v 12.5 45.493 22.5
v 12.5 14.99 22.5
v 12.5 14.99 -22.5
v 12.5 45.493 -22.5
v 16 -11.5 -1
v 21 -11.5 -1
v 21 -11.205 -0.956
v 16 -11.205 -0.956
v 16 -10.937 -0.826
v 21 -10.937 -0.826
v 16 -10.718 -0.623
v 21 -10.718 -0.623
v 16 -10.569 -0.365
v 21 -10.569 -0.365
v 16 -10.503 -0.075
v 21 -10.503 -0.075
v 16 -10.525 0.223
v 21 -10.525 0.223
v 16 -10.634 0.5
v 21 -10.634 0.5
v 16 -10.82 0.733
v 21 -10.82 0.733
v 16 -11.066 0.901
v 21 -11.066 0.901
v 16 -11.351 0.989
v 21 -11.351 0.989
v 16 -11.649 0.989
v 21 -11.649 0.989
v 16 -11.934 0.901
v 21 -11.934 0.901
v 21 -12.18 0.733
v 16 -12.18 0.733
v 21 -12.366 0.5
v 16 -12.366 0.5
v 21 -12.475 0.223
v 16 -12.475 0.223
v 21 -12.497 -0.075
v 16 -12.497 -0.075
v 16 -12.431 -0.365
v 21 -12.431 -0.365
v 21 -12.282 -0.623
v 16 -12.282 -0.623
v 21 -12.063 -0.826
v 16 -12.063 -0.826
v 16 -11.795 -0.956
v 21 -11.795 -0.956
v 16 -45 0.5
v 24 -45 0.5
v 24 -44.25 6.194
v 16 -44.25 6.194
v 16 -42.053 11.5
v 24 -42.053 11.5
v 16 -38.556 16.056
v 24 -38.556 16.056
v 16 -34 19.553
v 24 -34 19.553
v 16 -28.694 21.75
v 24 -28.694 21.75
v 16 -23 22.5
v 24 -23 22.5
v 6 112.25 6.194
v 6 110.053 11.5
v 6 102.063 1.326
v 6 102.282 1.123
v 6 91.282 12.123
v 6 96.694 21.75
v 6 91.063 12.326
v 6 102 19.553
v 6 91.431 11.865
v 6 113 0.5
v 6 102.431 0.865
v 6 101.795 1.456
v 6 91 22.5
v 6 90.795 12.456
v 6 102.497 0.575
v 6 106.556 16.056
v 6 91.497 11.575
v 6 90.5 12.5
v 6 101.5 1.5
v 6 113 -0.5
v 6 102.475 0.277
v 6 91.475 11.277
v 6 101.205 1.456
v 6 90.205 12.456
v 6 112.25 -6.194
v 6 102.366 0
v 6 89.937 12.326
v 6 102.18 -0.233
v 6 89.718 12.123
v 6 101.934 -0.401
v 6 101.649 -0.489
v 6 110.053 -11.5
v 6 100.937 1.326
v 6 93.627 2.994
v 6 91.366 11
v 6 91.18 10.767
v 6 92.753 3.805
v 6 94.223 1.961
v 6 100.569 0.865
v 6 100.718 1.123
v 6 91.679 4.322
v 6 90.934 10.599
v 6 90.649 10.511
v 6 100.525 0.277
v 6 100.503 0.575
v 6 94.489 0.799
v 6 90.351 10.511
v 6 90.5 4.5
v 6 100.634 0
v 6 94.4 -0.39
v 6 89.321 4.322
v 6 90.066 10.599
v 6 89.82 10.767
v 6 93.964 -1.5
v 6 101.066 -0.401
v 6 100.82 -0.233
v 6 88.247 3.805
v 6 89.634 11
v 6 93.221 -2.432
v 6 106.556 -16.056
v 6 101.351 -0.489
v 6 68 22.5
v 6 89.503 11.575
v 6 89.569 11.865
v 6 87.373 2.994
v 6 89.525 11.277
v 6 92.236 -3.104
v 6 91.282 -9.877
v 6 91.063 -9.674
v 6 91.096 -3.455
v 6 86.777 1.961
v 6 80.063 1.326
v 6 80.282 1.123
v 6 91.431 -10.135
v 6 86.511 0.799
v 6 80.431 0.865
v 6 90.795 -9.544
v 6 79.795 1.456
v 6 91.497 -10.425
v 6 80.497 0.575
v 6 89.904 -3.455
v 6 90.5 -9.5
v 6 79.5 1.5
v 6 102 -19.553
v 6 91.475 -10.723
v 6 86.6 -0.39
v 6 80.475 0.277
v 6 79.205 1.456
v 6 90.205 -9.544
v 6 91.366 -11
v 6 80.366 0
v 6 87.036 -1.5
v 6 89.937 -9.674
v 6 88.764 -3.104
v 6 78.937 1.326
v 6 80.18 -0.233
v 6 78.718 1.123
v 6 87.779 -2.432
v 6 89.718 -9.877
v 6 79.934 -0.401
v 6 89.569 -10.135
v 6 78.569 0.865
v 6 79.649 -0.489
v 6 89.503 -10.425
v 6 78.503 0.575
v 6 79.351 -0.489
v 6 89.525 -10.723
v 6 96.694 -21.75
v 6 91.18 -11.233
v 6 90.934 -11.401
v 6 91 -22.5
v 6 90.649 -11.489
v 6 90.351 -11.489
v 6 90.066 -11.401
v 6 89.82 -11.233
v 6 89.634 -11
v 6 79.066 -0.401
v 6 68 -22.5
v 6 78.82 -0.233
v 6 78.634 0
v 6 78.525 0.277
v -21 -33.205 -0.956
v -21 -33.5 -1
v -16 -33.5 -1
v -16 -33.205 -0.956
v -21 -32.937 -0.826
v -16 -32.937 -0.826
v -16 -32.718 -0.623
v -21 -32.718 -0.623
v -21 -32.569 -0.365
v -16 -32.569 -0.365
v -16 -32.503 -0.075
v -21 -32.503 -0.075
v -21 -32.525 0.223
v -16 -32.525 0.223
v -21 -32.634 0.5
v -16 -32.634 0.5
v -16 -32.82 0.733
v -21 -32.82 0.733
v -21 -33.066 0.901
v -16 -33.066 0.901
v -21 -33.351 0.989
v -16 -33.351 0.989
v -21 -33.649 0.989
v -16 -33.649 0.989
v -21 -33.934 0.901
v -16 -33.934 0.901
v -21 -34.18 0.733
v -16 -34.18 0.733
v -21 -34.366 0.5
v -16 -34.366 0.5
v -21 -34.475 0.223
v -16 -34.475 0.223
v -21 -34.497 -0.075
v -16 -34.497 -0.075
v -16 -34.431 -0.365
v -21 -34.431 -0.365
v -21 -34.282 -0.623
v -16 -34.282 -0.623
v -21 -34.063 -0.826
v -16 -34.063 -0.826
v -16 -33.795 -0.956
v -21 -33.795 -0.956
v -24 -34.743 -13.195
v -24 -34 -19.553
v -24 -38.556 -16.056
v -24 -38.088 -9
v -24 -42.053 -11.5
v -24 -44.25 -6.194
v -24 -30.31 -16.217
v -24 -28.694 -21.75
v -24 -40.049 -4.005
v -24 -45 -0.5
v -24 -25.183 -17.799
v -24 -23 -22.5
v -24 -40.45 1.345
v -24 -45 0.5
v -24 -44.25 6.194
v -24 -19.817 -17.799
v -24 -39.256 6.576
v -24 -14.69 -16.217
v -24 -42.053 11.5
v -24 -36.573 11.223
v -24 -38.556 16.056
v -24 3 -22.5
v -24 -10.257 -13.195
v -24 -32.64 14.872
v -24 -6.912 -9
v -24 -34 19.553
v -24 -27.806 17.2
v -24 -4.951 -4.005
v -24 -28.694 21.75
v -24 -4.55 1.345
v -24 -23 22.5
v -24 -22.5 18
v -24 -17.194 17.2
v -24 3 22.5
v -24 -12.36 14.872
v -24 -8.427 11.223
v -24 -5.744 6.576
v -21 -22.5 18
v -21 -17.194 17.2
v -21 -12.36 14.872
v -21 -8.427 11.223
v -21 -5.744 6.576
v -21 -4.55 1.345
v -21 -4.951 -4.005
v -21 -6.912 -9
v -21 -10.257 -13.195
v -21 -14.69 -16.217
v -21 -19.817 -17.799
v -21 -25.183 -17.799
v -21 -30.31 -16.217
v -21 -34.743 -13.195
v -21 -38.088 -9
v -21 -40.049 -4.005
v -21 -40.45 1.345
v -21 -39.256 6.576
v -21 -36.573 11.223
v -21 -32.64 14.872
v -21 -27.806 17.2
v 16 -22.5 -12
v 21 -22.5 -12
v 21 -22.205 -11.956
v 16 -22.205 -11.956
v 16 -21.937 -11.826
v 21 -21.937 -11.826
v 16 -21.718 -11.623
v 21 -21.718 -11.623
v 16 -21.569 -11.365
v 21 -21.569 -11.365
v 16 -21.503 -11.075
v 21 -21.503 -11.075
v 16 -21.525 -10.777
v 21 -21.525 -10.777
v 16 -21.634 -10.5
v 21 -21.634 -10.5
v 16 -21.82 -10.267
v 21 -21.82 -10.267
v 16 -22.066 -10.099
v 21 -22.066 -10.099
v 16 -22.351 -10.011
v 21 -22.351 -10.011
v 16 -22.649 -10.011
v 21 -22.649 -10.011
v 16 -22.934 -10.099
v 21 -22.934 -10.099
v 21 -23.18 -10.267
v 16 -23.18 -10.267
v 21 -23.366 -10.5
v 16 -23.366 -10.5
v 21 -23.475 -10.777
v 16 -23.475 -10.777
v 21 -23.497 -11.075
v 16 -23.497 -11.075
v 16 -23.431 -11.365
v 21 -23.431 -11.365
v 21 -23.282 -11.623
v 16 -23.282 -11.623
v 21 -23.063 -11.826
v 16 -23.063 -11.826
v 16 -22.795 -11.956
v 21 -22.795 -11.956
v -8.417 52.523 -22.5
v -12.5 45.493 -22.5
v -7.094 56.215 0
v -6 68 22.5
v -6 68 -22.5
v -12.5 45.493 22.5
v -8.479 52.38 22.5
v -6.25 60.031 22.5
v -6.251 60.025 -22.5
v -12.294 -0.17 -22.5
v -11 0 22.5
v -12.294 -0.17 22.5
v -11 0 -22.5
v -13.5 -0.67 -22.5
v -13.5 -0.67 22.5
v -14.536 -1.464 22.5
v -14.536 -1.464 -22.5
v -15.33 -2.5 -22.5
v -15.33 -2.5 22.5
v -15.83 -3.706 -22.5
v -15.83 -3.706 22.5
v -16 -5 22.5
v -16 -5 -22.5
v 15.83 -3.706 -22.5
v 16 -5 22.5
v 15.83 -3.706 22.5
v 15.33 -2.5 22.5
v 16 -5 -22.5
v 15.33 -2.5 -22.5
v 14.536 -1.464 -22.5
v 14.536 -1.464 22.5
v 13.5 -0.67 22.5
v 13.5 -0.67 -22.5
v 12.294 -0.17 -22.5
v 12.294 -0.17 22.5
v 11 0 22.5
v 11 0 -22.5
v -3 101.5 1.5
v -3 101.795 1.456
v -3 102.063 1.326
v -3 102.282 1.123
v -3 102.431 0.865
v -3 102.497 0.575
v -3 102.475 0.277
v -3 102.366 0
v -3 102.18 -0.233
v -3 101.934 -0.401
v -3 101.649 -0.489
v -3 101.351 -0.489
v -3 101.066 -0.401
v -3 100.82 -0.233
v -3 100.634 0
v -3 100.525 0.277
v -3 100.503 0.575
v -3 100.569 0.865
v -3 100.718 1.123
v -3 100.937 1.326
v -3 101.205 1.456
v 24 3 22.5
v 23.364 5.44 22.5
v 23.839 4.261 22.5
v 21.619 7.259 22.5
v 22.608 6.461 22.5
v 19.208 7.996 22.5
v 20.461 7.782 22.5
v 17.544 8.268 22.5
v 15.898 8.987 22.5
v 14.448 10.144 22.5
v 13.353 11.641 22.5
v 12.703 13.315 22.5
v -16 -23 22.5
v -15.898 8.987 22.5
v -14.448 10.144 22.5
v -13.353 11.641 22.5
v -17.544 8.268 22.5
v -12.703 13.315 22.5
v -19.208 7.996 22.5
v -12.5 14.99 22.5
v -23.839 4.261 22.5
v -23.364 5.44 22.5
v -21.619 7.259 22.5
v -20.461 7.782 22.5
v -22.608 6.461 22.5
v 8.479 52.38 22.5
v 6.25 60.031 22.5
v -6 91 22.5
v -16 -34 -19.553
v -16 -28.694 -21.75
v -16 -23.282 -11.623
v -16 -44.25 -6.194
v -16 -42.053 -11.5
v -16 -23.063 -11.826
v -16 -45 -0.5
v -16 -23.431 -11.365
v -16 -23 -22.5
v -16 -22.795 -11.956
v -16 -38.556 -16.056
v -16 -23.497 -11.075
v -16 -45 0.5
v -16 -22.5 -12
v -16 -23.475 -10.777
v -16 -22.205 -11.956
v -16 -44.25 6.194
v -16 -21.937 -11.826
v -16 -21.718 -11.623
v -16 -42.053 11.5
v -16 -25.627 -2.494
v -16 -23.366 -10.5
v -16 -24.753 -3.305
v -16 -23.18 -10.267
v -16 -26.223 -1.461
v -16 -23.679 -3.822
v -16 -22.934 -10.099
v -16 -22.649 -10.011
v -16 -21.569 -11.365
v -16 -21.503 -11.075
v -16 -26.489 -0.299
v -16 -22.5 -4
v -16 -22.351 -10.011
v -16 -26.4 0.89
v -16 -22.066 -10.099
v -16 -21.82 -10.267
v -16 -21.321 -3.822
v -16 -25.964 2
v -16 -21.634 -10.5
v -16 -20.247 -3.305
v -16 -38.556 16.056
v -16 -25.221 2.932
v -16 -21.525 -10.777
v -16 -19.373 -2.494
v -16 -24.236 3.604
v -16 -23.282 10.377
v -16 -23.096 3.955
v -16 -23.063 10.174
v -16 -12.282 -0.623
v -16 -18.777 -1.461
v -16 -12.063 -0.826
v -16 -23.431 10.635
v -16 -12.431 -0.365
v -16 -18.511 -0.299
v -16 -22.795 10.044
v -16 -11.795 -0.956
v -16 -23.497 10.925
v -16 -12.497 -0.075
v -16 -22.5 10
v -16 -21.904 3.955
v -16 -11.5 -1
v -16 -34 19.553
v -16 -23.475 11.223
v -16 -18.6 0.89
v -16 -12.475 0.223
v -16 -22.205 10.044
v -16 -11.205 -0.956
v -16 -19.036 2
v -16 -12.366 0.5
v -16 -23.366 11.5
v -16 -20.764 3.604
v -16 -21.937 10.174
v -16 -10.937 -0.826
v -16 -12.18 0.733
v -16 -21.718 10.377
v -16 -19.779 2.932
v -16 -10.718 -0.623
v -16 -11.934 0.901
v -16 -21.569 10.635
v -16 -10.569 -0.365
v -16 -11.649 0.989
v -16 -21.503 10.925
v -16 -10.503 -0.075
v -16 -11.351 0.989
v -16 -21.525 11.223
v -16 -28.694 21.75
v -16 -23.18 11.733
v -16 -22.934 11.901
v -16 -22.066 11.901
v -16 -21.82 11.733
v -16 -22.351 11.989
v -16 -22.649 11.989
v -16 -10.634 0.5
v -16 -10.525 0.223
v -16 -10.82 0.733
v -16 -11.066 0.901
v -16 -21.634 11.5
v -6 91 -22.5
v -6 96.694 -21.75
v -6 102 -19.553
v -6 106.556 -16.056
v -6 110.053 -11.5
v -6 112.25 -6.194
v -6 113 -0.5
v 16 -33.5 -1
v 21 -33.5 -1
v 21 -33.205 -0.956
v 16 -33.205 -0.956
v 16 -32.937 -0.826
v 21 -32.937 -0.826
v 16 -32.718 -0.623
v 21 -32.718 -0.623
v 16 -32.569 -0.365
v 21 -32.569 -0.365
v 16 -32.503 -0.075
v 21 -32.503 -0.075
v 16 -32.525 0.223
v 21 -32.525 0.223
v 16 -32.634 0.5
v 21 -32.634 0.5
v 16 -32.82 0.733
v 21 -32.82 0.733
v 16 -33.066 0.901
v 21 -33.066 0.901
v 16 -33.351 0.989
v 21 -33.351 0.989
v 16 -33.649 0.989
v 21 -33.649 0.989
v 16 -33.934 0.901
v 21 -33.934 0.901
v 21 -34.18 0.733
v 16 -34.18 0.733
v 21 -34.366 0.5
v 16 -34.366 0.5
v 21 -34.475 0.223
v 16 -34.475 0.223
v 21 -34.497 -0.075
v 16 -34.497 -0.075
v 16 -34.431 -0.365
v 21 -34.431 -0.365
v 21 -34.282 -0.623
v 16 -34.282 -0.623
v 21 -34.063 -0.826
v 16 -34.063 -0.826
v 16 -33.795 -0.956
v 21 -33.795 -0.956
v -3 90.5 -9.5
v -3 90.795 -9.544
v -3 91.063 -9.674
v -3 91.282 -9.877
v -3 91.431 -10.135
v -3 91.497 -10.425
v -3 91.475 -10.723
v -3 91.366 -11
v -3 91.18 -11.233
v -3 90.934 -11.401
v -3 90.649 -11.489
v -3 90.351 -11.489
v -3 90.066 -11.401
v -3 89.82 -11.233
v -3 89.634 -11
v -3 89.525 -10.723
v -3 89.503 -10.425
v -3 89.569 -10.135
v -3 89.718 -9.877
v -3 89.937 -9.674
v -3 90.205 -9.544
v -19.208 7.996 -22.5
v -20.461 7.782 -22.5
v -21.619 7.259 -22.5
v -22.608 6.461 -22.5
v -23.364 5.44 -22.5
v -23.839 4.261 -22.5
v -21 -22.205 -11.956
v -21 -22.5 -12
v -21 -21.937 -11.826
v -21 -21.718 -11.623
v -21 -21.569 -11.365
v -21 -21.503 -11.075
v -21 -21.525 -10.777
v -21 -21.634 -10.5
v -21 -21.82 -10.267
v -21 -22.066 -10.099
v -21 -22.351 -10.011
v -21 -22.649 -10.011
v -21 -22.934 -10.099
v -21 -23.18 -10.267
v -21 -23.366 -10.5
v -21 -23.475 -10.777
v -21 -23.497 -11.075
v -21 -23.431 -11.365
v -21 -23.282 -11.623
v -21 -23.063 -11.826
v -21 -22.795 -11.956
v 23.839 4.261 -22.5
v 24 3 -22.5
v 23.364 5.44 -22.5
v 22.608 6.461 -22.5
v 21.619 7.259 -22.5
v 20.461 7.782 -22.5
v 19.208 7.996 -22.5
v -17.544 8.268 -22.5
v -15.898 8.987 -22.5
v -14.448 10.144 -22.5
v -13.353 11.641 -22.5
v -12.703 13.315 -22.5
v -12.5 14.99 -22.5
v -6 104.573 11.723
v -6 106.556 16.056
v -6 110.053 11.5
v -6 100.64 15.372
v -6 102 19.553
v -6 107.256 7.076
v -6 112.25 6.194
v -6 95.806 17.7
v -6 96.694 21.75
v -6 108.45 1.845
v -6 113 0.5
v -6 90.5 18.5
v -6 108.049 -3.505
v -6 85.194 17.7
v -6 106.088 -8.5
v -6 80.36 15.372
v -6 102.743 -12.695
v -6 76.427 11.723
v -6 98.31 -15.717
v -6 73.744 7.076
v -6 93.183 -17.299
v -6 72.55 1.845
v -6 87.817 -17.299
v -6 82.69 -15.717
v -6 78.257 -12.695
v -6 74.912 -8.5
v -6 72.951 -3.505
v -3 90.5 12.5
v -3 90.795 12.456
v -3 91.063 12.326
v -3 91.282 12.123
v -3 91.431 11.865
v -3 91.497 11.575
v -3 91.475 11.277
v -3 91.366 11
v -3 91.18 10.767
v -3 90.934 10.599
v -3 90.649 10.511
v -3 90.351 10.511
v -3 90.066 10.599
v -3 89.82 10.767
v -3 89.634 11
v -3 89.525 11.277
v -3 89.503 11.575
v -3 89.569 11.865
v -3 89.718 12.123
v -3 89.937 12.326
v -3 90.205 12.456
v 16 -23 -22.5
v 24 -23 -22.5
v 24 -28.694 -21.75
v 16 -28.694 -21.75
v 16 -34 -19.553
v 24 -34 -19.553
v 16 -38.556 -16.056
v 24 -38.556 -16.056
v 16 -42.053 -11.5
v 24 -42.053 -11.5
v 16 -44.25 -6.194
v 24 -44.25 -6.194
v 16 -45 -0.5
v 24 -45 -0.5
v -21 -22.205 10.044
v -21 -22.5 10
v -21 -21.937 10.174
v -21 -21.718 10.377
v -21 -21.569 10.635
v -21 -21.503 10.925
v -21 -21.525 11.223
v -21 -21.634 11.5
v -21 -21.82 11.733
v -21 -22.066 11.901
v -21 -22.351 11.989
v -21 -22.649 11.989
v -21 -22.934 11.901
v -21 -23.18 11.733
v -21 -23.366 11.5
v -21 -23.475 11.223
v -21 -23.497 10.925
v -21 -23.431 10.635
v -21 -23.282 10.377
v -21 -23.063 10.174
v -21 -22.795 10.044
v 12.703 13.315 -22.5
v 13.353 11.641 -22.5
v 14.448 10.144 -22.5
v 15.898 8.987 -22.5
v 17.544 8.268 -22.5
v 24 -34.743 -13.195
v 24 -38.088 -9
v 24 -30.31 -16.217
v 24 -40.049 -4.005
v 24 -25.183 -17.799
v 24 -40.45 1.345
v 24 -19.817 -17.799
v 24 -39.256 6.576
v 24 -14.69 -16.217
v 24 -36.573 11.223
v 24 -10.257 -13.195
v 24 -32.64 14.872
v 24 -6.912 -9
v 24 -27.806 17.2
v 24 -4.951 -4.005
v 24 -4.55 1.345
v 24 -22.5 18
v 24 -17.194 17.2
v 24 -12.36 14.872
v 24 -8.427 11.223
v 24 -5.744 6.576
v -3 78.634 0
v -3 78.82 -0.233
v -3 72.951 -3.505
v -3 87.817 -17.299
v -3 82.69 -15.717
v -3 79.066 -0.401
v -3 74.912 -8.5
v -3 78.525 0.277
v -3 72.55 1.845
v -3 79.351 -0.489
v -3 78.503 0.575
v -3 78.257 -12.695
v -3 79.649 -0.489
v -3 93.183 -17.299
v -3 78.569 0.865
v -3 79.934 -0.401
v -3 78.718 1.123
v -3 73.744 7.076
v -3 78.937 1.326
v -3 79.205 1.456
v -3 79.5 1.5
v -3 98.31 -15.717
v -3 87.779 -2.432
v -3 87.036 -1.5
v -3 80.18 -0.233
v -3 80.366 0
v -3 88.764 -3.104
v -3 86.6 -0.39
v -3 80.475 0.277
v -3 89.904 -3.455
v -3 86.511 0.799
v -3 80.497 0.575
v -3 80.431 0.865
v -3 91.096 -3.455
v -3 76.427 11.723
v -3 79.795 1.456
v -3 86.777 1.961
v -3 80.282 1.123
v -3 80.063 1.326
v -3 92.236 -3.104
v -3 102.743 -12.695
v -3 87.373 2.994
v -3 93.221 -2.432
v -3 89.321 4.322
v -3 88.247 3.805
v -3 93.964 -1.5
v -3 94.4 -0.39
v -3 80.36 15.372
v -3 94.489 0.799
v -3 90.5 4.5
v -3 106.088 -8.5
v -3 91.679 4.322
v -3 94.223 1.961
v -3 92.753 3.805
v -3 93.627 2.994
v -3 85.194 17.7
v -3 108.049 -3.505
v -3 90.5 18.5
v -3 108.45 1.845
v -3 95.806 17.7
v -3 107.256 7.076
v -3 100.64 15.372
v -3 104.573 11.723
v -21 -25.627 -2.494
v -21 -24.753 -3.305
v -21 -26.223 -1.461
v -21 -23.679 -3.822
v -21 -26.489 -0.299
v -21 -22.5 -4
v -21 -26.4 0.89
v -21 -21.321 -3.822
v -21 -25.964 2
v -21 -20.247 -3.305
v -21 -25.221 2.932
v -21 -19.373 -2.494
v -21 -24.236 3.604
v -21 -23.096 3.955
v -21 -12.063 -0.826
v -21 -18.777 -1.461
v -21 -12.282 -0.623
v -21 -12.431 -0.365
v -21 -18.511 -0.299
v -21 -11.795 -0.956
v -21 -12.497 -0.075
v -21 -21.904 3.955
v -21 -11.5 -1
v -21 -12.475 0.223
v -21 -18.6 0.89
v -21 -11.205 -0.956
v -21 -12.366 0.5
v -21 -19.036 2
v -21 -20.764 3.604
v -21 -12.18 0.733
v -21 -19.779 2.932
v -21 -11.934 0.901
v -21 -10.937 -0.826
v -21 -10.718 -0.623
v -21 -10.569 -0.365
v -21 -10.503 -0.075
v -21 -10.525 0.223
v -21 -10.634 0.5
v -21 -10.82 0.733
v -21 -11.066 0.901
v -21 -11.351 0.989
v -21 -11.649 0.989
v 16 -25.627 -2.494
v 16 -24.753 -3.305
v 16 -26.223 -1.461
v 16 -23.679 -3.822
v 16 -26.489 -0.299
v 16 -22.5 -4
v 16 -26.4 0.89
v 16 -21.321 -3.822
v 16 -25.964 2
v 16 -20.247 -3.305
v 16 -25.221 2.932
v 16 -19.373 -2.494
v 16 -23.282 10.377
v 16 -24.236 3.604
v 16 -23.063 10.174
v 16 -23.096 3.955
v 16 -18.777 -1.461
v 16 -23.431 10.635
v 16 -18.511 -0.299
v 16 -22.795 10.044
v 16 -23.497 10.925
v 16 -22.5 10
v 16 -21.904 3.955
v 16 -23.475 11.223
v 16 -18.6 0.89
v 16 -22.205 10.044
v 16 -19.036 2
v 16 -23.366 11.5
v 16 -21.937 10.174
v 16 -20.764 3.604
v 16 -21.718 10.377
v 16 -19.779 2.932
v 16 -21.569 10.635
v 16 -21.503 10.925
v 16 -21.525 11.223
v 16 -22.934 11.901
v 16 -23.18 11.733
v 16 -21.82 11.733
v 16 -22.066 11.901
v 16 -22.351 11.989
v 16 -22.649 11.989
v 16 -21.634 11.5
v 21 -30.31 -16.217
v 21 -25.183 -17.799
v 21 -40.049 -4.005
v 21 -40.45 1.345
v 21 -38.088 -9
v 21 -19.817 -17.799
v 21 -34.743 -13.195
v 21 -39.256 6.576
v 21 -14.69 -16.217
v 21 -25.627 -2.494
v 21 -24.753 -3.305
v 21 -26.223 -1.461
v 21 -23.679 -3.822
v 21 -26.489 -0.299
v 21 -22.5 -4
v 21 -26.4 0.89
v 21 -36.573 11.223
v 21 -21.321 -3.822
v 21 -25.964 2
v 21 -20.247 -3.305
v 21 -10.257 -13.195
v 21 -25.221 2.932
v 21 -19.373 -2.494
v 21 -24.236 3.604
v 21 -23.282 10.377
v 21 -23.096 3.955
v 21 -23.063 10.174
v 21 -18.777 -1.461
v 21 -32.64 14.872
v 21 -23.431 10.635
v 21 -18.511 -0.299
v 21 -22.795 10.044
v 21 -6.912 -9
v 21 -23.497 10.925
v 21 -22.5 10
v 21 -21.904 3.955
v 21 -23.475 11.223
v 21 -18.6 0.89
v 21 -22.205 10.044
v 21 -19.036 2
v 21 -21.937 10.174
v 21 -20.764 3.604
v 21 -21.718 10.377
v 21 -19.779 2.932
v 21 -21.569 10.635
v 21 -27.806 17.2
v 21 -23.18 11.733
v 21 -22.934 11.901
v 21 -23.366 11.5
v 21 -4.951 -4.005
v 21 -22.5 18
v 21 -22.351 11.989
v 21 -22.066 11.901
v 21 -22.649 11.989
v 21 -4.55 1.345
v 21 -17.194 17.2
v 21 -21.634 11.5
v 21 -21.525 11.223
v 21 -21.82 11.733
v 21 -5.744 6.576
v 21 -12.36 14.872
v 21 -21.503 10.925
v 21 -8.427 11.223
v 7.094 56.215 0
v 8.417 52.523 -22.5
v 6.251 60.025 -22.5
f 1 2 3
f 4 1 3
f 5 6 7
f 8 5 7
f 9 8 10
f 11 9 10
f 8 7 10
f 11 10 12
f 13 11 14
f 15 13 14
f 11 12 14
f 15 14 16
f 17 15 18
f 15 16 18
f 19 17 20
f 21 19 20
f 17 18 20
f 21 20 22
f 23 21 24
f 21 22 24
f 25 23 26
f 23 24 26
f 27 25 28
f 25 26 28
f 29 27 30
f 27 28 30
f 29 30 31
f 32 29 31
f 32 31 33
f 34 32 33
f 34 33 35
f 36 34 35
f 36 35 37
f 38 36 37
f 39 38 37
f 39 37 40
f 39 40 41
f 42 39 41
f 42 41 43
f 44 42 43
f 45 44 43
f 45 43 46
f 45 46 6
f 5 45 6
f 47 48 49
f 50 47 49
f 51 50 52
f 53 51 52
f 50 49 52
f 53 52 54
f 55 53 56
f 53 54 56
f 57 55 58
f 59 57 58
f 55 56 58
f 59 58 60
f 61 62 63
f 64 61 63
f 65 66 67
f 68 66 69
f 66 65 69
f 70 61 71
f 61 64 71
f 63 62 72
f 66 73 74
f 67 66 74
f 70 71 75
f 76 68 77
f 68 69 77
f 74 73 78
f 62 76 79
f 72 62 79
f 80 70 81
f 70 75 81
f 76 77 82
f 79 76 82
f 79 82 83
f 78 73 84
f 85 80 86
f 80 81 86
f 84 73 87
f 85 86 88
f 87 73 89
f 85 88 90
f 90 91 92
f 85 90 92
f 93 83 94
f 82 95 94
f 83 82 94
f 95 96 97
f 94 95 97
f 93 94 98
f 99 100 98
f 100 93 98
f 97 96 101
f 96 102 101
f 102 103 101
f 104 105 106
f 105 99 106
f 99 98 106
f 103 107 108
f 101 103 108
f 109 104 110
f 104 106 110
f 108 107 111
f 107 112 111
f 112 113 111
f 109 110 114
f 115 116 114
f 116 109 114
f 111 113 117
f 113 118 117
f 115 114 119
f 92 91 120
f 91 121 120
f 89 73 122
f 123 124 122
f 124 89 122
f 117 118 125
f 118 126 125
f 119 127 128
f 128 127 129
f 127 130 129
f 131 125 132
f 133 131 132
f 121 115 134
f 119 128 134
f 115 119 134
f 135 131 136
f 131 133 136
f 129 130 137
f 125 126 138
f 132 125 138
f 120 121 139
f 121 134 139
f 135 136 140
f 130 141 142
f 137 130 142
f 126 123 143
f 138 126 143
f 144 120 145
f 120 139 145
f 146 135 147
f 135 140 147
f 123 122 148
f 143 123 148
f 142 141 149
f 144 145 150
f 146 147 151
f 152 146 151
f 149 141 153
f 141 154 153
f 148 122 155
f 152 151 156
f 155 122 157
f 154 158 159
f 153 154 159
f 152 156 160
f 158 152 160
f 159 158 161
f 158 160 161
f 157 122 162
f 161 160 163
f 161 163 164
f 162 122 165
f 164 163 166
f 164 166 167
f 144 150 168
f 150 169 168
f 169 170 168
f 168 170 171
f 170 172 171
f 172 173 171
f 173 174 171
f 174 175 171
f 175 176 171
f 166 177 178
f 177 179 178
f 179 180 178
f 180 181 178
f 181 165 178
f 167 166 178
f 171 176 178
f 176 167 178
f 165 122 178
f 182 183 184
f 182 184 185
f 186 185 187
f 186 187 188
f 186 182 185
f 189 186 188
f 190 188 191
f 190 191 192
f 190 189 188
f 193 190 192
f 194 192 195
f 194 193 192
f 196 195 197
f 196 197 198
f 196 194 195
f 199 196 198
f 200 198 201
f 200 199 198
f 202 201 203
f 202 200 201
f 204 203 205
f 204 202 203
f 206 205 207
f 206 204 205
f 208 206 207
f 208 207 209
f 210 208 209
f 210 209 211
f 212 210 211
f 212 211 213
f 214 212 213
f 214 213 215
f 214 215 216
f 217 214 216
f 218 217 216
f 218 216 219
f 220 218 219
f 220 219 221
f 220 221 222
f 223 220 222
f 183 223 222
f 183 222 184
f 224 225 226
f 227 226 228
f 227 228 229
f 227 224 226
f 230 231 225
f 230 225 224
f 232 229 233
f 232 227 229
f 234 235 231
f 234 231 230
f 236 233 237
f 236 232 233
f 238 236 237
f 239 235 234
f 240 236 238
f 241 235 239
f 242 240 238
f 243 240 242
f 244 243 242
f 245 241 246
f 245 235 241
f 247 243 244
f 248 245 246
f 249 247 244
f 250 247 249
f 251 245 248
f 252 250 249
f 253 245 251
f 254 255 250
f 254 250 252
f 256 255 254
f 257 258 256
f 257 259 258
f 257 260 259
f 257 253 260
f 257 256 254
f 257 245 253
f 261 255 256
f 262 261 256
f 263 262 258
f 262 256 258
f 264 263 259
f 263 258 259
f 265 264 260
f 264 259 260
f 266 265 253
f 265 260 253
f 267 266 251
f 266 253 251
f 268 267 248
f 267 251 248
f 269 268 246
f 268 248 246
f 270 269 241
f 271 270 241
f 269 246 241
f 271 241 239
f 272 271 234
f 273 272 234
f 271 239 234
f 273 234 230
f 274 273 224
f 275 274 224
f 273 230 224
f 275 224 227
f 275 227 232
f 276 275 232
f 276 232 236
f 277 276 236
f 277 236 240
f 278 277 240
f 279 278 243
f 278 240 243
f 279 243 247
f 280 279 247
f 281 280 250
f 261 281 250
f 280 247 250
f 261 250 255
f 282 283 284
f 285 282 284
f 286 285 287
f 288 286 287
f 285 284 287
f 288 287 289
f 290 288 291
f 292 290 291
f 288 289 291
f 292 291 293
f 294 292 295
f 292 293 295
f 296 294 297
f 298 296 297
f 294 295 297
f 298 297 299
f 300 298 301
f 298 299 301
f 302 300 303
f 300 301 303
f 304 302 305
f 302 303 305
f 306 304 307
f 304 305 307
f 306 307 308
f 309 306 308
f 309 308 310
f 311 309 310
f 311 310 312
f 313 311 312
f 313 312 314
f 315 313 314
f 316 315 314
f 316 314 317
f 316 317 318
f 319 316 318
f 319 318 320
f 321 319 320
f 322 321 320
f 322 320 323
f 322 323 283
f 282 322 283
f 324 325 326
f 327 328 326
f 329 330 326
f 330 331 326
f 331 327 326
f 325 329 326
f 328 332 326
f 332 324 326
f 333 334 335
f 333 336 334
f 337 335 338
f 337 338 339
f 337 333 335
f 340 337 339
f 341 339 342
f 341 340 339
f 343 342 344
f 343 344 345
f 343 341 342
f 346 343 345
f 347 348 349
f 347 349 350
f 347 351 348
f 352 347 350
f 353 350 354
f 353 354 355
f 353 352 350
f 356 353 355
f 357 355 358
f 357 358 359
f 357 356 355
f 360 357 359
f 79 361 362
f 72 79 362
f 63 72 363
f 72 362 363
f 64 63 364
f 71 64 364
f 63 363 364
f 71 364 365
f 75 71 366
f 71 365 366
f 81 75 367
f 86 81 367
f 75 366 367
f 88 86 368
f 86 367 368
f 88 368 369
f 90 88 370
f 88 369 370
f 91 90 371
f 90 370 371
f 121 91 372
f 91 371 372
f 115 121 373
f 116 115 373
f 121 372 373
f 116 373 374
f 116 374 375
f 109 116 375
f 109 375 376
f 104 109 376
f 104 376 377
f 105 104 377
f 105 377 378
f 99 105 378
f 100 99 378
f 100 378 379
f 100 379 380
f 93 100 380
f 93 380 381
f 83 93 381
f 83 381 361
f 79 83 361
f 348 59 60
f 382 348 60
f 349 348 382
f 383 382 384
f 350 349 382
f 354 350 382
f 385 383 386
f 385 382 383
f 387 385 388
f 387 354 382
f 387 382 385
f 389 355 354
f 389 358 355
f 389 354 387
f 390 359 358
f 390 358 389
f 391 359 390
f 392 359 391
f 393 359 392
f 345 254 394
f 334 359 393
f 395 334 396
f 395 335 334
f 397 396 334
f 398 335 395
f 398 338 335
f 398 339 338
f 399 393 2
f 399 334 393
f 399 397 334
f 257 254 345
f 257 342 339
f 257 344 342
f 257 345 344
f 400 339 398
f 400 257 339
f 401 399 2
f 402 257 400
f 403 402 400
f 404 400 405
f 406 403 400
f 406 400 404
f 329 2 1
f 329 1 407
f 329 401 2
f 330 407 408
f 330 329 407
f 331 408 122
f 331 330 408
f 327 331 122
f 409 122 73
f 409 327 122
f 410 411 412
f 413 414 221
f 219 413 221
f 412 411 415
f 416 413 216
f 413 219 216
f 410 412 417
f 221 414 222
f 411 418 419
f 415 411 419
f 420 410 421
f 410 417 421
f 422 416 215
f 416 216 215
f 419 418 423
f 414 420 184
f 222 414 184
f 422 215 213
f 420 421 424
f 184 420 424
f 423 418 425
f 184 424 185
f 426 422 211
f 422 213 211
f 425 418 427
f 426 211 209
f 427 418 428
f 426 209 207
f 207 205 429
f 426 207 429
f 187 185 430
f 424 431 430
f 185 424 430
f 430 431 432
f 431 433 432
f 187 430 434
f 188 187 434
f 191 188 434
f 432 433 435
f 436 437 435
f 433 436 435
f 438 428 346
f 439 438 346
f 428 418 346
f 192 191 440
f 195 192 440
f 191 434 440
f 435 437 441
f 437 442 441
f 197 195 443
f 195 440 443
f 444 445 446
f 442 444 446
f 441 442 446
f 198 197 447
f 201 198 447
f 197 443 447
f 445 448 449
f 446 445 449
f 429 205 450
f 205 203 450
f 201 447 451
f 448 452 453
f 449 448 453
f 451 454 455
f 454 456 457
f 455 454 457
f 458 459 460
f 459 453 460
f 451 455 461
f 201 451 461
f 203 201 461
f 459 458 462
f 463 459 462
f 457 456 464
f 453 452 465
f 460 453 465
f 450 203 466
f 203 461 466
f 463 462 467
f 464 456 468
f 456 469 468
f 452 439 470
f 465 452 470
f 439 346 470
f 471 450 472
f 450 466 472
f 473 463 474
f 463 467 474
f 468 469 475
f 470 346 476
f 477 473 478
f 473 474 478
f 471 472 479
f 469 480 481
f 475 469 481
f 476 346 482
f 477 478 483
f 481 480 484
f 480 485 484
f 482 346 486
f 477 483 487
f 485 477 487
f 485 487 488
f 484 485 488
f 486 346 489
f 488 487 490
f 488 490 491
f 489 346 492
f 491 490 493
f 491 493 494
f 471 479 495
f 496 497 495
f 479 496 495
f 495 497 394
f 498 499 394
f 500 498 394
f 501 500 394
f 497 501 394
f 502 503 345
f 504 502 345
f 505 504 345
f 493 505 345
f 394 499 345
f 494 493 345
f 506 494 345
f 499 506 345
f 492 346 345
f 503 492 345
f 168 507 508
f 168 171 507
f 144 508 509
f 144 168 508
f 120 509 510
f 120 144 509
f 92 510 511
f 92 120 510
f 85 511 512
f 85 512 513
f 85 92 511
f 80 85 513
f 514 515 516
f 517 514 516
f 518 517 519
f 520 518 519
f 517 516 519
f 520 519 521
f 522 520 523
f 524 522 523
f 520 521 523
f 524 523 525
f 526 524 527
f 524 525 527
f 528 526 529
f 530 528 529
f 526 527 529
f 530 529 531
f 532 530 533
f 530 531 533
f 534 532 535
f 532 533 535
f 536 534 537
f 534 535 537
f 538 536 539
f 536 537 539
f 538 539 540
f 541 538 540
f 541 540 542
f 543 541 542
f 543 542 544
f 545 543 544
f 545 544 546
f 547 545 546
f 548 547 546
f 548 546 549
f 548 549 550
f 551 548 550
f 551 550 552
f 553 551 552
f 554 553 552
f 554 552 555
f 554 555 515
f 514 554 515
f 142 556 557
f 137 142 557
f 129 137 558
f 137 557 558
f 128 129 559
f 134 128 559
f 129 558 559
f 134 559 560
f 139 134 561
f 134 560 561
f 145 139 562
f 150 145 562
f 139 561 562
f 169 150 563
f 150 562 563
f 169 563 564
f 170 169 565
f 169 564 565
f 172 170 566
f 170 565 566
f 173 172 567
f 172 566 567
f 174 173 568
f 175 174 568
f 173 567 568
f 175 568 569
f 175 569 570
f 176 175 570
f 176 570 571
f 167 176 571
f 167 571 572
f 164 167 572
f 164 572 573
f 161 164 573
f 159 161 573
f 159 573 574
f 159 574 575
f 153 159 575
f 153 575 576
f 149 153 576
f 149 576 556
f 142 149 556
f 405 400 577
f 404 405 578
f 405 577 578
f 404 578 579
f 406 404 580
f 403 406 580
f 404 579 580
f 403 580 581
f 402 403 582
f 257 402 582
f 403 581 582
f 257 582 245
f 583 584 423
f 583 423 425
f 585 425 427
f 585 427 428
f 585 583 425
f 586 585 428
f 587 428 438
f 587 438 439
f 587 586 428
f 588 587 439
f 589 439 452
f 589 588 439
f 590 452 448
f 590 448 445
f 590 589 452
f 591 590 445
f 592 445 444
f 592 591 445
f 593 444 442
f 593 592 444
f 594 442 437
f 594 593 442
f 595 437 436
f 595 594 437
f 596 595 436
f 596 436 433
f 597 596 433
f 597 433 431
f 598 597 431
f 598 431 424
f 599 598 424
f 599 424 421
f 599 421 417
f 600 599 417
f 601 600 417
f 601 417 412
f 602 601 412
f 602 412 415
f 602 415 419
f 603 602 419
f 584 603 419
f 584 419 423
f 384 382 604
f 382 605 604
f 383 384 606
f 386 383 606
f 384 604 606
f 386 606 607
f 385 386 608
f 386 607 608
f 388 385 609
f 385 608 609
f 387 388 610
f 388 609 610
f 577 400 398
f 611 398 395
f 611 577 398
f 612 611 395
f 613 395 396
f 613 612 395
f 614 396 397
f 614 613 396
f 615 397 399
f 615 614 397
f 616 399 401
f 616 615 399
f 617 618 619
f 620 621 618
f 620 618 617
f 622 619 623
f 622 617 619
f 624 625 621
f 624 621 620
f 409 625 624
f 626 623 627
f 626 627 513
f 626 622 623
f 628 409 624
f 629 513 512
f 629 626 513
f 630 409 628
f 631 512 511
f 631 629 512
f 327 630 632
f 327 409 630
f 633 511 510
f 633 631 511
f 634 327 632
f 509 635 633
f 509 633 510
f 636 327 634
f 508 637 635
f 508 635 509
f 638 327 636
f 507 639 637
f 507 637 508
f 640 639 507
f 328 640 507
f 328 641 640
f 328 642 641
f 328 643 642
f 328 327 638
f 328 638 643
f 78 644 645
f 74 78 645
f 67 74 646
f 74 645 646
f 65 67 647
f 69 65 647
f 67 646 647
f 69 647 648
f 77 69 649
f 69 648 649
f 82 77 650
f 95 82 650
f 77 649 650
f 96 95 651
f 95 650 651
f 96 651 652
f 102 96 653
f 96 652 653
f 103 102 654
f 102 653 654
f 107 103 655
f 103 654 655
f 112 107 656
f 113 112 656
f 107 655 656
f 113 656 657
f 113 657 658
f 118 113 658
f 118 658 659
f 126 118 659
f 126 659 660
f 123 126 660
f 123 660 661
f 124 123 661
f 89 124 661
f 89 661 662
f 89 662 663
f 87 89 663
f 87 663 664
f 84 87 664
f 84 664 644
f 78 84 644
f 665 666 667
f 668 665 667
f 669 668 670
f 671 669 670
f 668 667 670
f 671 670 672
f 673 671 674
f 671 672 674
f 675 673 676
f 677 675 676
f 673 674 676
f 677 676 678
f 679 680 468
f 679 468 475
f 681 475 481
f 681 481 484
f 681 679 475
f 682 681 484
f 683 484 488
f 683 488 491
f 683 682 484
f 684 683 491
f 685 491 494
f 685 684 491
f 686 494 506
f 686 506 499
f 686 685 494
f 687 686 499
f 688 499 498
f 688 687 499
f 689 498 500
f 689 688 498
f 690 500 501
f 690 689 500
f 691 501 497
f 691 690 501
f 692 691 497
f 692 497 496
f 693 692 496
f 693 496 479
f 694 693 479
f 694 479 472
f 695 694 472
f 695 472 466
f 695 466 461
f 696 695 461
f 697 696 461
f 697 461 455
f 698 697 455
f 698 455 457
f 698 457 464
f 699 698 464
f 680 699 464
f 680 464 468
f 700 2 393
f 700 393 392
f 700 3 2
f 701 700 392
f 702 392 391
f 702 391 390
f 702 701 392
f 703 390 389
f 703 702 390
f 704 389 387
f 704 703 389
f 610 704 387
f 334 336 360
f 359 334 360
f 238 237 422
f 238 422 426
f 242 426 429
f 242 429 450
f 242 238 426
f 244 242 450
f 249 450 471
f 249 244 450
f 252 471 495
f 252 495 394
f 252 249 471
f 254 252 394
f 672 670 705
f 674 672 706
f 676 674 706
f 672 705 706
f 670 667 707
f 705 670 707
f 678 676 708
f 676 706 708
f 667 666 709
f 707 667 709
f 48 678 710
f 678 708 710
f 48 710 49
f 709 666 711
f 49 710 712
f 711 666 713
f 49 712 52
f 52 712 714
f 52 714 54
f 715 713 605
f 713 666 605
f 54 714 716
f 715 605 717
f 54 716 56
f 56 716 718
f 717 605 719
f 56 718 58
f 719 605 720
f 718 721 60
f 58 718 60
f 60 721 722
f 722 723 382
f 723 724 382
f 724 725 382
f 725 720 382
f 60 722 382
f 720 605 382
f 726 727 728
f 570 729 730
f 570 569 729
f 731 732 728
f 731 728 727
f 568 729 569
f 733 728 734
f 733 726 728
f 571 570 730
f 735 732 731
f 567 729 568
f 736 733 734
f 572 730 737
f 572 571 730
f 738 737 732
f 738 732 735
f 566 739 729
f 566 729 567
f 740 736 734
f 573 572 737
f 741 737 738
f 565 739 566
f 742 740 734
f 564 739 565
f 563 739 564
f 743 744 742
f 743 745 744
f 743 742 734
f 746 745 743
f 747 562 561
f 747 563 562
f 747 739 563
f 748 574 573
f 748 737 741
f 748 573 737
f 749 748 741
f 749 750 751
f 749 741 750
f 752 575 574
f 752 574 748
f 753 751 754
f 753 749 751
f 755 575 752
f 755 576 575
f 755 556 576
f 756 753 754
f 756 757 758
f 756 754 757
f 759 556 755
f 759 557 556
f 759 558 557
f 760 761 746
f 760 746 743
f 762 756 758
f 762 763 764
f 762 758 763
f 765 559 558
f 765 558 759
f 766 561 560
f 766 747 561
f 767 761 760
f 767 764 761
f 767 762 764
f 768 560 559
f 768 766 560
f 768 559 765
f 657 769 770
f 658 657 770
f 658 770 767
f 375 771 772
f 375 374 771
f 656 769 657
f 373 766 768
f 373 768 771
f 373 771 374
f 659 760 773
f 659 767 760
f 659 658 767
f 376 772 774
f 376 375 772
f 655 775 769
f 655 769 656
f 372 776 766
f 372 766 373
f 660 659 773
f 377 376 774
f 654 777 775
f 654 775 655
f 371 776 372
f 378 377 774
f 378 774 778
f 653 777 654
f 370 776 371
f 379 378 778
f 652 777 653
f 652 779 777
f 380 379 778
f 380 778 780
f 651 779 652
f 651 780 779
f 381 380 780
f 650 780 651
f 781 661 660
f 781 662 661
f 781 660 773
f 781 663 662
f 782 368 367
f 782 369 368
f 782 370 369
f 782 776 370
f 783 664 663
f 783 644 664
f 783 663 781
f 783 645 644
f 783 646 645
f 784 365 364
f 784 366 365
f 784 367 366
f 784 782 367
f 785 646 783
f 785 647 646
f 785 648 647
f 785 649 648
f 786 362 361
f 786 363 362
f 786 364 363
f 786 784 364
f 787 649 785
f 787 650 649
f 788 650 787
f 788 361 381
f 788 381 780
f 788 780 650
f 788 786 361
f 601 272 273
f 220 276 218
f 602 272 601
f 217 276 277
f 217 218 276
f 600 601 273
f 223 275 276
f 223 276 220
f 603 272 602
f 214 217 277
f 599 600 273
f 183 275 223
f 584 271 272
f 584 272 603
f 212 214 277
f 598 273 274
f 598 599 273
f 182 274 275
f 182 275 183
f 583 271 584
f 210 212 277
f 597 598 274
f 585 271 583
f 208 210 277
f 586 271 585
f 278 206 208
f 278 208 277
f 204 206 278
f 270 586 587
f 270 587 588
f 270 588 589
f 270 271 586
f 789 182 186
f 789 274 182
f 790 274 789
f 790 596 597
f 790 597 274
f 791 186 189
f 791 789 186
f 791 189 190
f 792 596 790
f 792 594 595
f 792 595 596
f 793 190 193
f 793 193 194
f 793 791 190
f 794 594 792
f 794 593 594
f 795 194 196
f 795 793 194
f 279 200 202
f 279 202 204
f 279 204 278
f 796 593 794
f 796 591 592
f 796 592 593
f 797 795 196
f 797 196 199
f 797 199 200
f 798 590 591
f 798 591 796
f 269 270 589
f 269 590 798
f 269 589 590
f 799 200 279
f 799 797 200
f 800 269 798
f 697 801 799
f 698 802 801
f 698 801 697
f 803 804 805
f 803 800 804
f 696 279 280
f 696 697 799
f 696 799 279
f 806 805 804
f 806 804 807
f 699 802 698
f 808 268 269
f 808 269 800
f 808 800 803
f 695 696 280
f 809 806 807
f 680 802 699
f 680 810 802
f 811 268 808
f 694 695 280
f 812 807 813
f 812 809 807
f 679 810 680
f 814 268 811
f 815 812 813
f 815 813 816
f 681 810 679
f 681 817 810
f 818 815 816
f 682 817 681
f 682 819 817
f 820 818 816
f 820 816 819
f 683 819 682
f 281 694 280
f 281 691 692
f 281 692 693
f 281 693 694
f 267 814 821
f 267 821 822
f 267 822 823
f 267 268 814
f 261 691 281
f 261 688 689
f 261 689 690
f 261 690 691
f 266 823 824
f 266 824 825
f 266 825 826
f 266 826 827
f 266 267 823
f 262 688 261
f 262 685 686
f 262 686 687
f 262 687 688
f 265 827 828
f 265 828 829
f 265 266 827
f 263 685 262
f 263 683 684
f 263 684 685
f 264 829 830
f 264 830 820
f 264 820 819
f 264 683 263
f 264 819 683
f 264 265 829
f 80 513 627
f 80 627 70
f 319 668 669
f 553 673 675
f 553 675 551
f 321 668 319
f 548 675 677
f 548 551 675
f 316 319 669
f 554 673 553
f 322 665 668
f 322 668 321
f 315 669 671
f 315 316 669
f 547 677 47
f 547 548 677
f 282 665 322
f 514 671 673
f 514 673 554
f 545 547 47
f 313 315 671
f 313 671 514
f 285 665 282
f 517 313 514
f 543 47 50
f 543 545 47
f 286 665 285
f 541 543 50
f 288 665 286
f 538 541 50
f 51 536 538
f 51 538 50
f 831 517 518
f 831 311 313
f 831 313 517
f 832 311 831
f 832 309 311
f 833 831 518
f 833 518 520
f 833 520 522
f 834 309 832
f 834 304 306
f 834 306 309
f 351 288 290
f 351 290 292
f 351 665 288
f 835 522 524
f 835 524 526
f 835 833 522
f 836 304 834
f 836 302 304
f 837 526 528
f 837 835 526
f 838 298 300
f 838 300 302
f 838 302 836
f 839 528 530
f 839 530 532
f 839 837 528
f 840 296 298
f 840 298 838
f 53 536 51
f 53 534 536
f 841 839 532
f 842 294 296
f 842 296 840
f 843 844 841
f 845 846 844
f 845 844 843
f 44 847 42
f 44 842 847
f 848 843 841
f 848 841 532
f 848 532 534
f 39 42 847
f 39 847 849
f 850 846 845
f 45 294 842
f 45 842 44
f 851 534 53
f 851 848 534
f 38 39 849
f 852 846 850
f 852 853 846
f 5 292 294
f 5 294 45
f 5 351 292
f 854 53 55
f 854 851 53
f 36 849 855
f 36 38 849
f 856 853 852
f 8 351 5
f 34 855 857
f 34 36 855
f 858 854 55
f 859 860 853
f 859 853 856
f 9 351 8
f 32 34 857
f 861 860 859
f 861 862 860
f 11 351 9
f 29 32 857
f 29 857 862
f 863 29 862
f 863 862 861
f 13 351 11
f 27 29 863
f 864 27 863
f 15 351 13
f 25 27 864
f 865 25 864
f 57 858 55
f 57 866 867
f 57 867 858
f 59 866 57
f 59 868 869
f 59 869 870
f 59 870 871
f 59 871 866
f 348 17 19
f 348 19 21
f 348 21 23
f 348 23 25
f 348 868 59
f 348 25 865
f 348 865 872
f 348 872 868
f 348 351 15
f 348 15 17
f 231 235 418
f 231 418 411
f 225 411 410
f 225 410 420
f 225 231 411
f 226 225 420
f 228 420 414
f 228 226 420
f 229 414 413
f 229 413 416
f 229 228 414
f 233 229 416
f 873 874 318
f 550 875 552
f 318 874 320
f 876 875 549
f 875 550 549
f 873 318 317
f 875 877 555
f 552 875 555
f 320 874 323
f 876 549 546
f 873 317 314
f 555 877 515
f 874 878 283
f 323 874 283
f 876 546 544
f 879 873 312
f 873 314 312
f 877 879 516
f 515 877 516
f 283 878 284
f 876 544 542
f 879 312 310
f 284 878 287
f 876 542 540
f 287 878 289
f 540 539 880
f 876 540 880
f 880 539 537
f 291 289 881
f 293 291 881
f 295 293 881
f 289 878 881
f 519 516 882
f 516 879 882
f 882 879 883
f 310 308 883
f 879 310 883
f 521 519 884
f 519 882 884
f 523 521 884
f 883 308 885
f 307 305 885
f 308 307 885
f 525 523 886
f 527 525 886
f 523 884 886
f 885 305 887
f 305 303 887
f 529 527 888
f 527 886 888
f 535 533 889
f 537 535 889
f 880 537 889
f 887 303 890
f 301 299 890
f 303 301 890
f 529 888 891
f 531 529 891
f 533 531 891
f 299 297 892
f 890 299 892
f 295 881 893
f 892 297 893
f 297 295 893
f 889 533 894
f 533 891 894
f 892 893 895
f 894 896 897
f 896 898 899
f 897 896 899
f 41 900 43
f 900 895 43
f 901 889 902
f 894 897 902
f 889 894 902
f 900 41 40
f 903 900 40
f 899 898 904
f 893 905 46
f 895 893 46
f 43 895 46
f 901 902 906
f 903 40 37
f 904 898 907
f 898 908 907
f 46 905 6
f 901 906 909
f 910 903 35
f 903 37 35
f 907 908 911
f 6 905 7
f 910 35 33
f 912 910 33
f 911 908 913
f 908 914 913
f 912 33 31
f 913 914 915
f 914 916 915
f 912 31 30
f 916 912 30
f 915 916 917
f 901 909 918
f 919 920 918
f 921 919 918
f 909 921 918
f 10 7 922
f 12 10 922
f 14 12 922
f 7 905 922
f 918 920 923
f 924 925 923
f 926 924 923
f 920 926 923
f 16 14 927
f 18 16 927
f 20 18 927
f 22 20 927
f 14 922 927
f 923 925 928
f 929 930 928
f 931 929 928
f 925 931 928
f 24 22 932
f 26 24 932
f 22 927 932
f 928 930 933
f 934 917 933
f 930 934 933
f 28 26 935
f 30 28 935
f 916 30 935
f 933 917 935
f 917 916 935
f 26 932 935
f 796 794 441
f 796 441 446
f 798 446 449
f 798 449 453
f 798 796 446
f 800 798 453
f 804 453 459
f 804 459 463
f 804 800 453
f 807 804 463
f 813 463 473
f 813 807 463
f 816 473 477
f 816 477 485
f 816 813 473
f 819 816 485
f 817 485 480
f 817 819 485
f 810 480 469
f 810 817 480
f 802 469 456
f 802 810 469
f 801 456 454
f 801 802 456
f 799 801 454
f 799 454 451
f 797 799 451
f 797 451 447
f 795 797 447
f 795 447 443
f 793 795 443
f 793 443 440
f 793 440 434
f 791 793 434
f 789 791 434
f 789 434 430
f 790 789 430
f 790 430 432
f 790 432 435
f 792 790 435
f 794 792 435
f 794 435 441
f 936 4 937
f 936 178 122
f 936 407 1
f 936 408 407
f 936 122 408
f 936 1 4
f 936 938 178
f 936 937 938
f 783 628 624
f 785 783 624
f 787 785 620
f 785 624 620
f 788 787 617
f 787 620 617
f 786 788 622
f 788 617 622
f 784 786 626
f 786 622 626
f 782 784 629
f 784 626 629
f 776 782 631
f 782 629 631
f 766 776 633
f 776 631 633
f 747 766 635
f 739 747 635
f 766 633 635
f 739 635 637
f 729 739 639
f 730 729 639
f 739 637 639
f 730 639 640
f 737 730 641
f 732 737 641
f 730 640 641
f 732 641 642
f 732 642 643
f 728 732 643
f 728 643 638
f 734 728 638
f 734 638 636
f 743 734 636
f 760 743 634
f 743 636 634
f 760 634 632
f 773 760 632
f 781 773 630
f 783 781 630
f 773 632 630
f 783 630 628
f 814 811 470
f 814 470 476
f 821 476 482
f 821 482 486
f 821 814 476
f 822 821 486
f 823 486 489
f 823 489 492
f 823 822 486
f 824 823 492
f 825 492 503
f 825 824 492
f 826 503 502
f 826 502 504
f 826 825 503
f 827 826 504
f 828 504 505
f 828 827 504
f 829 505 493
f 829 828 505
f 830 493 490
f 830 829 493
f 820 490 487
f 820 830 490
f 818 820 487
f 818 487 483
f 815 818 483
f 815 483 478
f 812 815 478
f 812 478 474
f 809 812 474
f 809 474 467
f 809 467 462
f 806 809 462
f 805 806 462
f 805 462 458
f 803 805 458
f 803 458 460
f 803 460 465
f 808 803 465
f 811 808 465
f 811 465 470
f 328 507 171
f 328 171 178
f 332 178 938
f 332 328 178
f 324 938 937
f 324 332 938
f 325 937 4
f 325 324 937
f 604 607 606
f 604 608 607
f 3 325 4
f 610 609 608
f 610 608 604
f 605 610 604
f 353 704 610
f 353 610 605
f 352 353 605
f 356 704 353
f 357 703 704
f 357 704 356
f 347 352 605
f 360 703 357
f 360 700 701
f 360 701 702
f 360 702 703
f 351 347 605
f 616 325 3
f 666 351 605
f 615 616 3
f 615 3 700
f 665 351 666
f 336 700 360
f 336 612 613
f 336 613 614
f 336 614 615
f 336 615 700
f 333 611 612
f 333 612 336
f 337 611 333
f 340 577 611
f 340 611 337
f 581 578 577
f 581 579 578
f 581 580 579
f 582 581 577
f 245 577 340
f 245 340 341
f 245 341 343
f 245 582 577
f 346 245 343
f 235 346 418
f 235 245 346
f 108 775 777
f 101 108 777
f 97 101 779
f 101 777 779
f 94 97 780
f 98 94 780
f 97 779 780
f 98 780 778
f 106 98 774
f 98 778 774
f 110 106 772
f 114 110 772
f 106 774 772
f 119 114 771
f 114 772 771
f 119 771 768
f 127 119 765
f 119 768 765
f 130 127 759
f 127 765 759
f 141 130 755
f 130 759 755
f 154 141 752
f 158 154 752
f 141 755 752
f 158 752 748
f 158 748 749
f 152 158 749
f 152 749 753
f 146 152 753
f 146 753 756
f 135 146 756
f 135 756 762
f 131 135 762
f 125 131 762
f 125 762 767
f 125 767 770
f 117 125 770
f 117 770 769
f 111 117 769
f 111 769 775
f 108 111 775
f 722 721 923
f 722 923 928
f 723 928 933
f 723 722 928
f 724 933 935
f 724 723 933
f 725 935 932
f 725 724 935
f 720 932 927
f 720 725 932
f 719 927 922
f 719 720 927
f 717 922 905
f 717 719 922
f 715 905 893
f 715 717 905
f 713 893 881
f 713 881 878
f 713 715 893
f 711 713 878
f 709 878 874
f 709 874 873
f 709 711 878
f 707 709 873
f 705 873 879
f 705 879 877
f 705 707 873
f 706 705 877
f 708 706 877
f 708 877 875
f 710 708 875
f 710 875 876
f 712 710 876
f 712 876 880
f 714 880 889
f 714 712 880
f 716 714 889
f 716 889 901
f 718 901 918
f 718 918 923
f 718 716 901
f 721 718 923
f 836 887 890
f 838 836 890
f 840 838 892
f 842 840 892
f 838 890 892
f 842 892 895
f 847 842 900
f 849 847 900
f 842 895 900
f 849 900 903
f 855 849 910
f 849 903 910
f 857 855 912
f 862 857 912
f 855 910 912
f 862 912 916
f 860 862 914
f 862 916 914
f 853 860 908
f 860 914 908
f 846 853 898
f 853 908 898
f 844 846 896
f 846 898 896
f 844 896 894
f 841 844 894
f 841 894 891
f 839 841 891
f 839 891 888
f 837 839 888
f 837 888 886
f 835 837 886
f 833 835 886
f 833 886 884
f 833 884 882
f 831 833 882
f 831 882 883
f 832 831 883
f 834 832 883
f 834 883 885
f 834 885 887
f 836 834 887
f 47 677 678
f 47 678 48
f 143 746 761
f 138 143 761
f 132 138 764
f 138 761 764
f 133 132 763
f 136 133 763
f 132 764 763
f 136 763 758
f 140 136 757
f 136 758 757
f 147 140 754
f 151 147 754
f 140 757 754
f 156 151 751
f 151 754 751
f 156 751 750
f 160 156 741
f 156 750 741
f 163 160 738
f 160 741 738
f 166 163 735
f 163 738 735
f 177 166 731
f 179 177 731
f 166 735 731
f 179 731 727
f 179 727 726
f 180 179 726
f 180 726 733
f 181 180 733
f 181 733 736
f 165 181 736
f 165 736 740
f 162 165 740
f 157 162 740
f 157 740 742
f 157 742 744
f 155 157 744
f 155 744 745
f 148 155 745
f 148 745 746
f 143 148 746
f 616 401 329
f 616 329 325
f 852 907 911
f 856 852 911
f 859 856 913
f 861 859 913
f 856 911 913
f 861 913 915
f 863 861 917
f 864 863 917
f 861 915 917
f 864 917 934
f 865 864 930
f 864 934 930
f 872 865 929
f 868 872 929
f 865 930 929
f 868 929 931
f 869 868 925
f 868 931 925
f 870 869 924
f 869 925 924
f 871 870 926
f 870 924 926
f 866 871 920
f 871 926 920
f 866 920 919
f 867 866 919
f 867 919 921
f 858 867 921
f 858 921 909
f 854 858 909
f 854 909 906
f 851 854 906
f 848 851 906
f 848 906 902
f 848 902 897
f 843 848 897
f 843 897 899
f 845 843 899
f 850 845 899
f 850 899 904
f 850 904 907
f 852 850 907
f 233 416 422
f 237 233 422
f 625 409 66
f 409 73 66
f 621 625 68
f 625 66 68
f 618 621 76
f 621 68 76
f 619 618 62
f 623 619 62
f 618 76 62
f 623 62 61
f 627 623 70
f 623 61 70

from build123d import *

# Parameters (mm, degrees)
SKETCH2_W           = 48
SKETCH2_H           = 45
BOSS_EXTRUDE1_DEPTH = 8
BOSS_EXTRUDE2_DEPTH = 8
CUT_EXTRUDE1_START  = -8
SKETCH4_R           = 18
CUT_EXTRUDE1_DEPTH  = 3
SKETCH5_R           = 4
SKETCH5_R_2         = 1
CUT_EXTRUDE2_DEPTH  = 46
SKETCH6_W           = 25
SKETCH6_H           = 45
BOSS_EXTRUDE3_DEPTH = 60
FILLET7_R           = 5
SKETCH7_W           = 12
SKETCH7_H           = 45
BOSS_EXTRUDE4_DEPTH = 45
FILLET10_R          = 22
SKETCH8_R           = 18
CUT_EXTRUDE3_DEPTH  = 3
SKETCH9_R           = 4
SKETCH9_R_2         = 1
CUT_EXTRUDE4_DEPTH  = 28
CUT_EXTRUDE5_DEPTH  = 46
FILLET11_R          = 5
FILLET12_R          = 7


with BuildPart() as part:
    # Sketch2 → Boss-Extrude1 (new body)
    with BuildSketch(Plane(origin=(0, 0, 0), x_dir=(1, 0, 0), z_dir=(0, 1, 0))):
        Rectangle(SKETCH2_W, SKETCH2_H)
    extrude(amount=BOSS_EXTRUDE1_DEPTH)

    # Sketch3 → Boss-Extrude2 (add)
    with BuildSketch(Plane(origin=(24, 0, 0), x_dir=(0, 0, -1), z_dir=(1, 0, 0))):
        with BuildLine():
            Line((-22.5, 0), (22.5, 0))
            Line((22.5, 0), (22.5, -23))
            ThreePointArc((22.5, -23), (16.056349186, -38.556349186), (0.5, -45))
            Line((0.5, -45), (-0.5, -45))
            ThreePointArc((-0.5, -45), (-16.056349186, -38.556349186), (-22.5, -23))
            Line((-22.5, -23), (-22.5, 0))
        make_face()
    extrude(amount=-BOSS_EXTRUDE2_DEPTH)

    # Sketch4 → Cut-Extrude1 (cut)
    with BuildSketch(Plane.ZY.offset(-16).offset(CUT_EXTRUDE1_START)):
        with Locations((0, -22.5)):
            Circle(SKETCH4_R)
    extrude(amount=CUT_EXTRUDE1_DEPTH, mode=Mode.SUBTRACT)

    # Sketch5 → Cut-Extrude2 (cut, through all)
    with BuildSketch(Plane(origin=(21, 0, 0), x_dir=(0, 0, -1), z_dir=(1, 0, 0))):
        with Locations((0, -22.5)):
            Circle(SKETCH5_R)
        with Locations((0, -11.5)):
            Circle(SKETCH5_R_2)
        with Locations((11, -22.5)):
            Circle(SKETCH5_R_2)
        with Locations((0, -33.5)):
            Circle(SKETCH5_R_2)
        with Locations((-11, -22.5)):
            Circle(SKETCH5_R_2)
    extrude(amount=-CUT_EXTRUDE2_DEPTH, mode=Mode.SUBTRACT)

    # Mirror1: part across plane


with BuildPart() as part_1:
    add(part.part)
    add(part.part.mirror(Plane(origin=(0, 0, 0), x_dir=(0, 0, 1), z_dir=(1, 0, 0))))

    # Sketch6 → Boss-Extrude3 (add)
    with BuildSketch(Plane(origin=(0, 8, 0), x_dir=(1, 0, 0), z_dir=(0, 1, 0))):
        Rectangle(SKETCH6_W, SKETCH6_H)
    extrude(amount=BOSS_EXTRUDE3_DEPTH)

    # Fillet7
    fillet7_edges = [part_1.edges().sort_by_distance(p)[0] for p in [
        (16, 0, 0),
        (-16, 0, 0),
    ]]
    fillet(fillet7_edges, radius=FILLET7_R)

    # Sketch7 → Boss-Extrude4 (add)
    with BuildSketch(Plane(origin=(0, 68, 0), x_dir=(1, 0, 0), z_dir=(0, 1, 0))):
        Rectangle(SKETCH7_W, SKETCH7_H)
    extrude(amount=BOSS_EXTRUDE4_DEPTH)

    # Fillet10
    fillet10_edges = [part_1.edges().sort_by_distance(p)[0] for p in [
        (0, 113, -22.5),
        (0, 113, 22.5),
    ]]
    fillet(fillet10_edges, radius=FILLET10_R)

    # Sketch8 → Cut-Extrude3 (cut)
    with BuildSketch(Plane.ZY.offset(6)):
        with Locations((0.5, 90.5)):
            Circle(SKETCH8_R)
    extrude(amount=-CUT_EXTRUDE3_DEPTH, mode=Mode.SUBTRACT)

    # Sketch9 → Cut-Extrude4 (cut, through all)
    with BuildSketch(Plane.ZY.offset(3)):
        with Locations((0.5, 90.5)):
            Circle(SKETCH9_R)
        with Locations((0.5, 101.5)):
            Circle(SKETCH9_R_2)
        with Locations((11.5, 90.5)):
            Circle(SKETCH9_R_2)
        with Locations((0.5, 79.5)):
            Circle(SKETCH9_R_2)
        with Locations((-10.5, 90.5)):
            Circle(SKETCH9_R_2)
    extrude(amount=-CUT_EXTRUDE4_DEPTH, mode=Mode.SUBTRACT)

    # Sketch10 → Cut-Extrude5 (cut, through all)
    with BuildSketch(Plane(origin=(0, 0, -22.5), x_dir=(-1, 0, 0), z_dir=(0, 0, -1))):
        with BuildLine():
            Line((12.5, 68), (6, 68))
            add(Edge.make_bspline(
                [(6, 68), (4.938641011, 55.683018677), (12.5, 45.493141657)],
                knots=[0, 0, 0, 1, 1, 1], degree=2))
            Line((12.5, 45.493141657), (12.5, 68))
        make_face()
        with BuildLine():
            Line((-6, 68), (-12.5, 68))
            Line((-12.5, 68), (-12.5, 45.493141657))
            add(Edge.make_bspline(
                [(-6, 68), (-4.938641011, 55.683018677), (-12.5, 45.493141657)],
                knots=[0, 0, 0, 1, 1, 1], degree=2))
        make_face()
    extrude(amount=-CUT_EXTRUDE5_DEPTH, mode=Mode.SUBTRACT)

    # Fillet11
    fillet11_edges = [part_1.edges().sort_by_distance(p)[0] for p in [
        (24, 8, 0),
        (-24, 8, 0),
    ]]
    fillet(fillet11_edges, radius=FILLET11_R)

    # Fillet12
    fillet12_edges = [part_1.edges().sort_by_distance(p)[0] for p in [
        (-12.5, 8, 0),
        (12.5, 8, 0),
    ]]
    fillet(fillet12_edges, radius=FILLET12_R)


solid = part_1.part
